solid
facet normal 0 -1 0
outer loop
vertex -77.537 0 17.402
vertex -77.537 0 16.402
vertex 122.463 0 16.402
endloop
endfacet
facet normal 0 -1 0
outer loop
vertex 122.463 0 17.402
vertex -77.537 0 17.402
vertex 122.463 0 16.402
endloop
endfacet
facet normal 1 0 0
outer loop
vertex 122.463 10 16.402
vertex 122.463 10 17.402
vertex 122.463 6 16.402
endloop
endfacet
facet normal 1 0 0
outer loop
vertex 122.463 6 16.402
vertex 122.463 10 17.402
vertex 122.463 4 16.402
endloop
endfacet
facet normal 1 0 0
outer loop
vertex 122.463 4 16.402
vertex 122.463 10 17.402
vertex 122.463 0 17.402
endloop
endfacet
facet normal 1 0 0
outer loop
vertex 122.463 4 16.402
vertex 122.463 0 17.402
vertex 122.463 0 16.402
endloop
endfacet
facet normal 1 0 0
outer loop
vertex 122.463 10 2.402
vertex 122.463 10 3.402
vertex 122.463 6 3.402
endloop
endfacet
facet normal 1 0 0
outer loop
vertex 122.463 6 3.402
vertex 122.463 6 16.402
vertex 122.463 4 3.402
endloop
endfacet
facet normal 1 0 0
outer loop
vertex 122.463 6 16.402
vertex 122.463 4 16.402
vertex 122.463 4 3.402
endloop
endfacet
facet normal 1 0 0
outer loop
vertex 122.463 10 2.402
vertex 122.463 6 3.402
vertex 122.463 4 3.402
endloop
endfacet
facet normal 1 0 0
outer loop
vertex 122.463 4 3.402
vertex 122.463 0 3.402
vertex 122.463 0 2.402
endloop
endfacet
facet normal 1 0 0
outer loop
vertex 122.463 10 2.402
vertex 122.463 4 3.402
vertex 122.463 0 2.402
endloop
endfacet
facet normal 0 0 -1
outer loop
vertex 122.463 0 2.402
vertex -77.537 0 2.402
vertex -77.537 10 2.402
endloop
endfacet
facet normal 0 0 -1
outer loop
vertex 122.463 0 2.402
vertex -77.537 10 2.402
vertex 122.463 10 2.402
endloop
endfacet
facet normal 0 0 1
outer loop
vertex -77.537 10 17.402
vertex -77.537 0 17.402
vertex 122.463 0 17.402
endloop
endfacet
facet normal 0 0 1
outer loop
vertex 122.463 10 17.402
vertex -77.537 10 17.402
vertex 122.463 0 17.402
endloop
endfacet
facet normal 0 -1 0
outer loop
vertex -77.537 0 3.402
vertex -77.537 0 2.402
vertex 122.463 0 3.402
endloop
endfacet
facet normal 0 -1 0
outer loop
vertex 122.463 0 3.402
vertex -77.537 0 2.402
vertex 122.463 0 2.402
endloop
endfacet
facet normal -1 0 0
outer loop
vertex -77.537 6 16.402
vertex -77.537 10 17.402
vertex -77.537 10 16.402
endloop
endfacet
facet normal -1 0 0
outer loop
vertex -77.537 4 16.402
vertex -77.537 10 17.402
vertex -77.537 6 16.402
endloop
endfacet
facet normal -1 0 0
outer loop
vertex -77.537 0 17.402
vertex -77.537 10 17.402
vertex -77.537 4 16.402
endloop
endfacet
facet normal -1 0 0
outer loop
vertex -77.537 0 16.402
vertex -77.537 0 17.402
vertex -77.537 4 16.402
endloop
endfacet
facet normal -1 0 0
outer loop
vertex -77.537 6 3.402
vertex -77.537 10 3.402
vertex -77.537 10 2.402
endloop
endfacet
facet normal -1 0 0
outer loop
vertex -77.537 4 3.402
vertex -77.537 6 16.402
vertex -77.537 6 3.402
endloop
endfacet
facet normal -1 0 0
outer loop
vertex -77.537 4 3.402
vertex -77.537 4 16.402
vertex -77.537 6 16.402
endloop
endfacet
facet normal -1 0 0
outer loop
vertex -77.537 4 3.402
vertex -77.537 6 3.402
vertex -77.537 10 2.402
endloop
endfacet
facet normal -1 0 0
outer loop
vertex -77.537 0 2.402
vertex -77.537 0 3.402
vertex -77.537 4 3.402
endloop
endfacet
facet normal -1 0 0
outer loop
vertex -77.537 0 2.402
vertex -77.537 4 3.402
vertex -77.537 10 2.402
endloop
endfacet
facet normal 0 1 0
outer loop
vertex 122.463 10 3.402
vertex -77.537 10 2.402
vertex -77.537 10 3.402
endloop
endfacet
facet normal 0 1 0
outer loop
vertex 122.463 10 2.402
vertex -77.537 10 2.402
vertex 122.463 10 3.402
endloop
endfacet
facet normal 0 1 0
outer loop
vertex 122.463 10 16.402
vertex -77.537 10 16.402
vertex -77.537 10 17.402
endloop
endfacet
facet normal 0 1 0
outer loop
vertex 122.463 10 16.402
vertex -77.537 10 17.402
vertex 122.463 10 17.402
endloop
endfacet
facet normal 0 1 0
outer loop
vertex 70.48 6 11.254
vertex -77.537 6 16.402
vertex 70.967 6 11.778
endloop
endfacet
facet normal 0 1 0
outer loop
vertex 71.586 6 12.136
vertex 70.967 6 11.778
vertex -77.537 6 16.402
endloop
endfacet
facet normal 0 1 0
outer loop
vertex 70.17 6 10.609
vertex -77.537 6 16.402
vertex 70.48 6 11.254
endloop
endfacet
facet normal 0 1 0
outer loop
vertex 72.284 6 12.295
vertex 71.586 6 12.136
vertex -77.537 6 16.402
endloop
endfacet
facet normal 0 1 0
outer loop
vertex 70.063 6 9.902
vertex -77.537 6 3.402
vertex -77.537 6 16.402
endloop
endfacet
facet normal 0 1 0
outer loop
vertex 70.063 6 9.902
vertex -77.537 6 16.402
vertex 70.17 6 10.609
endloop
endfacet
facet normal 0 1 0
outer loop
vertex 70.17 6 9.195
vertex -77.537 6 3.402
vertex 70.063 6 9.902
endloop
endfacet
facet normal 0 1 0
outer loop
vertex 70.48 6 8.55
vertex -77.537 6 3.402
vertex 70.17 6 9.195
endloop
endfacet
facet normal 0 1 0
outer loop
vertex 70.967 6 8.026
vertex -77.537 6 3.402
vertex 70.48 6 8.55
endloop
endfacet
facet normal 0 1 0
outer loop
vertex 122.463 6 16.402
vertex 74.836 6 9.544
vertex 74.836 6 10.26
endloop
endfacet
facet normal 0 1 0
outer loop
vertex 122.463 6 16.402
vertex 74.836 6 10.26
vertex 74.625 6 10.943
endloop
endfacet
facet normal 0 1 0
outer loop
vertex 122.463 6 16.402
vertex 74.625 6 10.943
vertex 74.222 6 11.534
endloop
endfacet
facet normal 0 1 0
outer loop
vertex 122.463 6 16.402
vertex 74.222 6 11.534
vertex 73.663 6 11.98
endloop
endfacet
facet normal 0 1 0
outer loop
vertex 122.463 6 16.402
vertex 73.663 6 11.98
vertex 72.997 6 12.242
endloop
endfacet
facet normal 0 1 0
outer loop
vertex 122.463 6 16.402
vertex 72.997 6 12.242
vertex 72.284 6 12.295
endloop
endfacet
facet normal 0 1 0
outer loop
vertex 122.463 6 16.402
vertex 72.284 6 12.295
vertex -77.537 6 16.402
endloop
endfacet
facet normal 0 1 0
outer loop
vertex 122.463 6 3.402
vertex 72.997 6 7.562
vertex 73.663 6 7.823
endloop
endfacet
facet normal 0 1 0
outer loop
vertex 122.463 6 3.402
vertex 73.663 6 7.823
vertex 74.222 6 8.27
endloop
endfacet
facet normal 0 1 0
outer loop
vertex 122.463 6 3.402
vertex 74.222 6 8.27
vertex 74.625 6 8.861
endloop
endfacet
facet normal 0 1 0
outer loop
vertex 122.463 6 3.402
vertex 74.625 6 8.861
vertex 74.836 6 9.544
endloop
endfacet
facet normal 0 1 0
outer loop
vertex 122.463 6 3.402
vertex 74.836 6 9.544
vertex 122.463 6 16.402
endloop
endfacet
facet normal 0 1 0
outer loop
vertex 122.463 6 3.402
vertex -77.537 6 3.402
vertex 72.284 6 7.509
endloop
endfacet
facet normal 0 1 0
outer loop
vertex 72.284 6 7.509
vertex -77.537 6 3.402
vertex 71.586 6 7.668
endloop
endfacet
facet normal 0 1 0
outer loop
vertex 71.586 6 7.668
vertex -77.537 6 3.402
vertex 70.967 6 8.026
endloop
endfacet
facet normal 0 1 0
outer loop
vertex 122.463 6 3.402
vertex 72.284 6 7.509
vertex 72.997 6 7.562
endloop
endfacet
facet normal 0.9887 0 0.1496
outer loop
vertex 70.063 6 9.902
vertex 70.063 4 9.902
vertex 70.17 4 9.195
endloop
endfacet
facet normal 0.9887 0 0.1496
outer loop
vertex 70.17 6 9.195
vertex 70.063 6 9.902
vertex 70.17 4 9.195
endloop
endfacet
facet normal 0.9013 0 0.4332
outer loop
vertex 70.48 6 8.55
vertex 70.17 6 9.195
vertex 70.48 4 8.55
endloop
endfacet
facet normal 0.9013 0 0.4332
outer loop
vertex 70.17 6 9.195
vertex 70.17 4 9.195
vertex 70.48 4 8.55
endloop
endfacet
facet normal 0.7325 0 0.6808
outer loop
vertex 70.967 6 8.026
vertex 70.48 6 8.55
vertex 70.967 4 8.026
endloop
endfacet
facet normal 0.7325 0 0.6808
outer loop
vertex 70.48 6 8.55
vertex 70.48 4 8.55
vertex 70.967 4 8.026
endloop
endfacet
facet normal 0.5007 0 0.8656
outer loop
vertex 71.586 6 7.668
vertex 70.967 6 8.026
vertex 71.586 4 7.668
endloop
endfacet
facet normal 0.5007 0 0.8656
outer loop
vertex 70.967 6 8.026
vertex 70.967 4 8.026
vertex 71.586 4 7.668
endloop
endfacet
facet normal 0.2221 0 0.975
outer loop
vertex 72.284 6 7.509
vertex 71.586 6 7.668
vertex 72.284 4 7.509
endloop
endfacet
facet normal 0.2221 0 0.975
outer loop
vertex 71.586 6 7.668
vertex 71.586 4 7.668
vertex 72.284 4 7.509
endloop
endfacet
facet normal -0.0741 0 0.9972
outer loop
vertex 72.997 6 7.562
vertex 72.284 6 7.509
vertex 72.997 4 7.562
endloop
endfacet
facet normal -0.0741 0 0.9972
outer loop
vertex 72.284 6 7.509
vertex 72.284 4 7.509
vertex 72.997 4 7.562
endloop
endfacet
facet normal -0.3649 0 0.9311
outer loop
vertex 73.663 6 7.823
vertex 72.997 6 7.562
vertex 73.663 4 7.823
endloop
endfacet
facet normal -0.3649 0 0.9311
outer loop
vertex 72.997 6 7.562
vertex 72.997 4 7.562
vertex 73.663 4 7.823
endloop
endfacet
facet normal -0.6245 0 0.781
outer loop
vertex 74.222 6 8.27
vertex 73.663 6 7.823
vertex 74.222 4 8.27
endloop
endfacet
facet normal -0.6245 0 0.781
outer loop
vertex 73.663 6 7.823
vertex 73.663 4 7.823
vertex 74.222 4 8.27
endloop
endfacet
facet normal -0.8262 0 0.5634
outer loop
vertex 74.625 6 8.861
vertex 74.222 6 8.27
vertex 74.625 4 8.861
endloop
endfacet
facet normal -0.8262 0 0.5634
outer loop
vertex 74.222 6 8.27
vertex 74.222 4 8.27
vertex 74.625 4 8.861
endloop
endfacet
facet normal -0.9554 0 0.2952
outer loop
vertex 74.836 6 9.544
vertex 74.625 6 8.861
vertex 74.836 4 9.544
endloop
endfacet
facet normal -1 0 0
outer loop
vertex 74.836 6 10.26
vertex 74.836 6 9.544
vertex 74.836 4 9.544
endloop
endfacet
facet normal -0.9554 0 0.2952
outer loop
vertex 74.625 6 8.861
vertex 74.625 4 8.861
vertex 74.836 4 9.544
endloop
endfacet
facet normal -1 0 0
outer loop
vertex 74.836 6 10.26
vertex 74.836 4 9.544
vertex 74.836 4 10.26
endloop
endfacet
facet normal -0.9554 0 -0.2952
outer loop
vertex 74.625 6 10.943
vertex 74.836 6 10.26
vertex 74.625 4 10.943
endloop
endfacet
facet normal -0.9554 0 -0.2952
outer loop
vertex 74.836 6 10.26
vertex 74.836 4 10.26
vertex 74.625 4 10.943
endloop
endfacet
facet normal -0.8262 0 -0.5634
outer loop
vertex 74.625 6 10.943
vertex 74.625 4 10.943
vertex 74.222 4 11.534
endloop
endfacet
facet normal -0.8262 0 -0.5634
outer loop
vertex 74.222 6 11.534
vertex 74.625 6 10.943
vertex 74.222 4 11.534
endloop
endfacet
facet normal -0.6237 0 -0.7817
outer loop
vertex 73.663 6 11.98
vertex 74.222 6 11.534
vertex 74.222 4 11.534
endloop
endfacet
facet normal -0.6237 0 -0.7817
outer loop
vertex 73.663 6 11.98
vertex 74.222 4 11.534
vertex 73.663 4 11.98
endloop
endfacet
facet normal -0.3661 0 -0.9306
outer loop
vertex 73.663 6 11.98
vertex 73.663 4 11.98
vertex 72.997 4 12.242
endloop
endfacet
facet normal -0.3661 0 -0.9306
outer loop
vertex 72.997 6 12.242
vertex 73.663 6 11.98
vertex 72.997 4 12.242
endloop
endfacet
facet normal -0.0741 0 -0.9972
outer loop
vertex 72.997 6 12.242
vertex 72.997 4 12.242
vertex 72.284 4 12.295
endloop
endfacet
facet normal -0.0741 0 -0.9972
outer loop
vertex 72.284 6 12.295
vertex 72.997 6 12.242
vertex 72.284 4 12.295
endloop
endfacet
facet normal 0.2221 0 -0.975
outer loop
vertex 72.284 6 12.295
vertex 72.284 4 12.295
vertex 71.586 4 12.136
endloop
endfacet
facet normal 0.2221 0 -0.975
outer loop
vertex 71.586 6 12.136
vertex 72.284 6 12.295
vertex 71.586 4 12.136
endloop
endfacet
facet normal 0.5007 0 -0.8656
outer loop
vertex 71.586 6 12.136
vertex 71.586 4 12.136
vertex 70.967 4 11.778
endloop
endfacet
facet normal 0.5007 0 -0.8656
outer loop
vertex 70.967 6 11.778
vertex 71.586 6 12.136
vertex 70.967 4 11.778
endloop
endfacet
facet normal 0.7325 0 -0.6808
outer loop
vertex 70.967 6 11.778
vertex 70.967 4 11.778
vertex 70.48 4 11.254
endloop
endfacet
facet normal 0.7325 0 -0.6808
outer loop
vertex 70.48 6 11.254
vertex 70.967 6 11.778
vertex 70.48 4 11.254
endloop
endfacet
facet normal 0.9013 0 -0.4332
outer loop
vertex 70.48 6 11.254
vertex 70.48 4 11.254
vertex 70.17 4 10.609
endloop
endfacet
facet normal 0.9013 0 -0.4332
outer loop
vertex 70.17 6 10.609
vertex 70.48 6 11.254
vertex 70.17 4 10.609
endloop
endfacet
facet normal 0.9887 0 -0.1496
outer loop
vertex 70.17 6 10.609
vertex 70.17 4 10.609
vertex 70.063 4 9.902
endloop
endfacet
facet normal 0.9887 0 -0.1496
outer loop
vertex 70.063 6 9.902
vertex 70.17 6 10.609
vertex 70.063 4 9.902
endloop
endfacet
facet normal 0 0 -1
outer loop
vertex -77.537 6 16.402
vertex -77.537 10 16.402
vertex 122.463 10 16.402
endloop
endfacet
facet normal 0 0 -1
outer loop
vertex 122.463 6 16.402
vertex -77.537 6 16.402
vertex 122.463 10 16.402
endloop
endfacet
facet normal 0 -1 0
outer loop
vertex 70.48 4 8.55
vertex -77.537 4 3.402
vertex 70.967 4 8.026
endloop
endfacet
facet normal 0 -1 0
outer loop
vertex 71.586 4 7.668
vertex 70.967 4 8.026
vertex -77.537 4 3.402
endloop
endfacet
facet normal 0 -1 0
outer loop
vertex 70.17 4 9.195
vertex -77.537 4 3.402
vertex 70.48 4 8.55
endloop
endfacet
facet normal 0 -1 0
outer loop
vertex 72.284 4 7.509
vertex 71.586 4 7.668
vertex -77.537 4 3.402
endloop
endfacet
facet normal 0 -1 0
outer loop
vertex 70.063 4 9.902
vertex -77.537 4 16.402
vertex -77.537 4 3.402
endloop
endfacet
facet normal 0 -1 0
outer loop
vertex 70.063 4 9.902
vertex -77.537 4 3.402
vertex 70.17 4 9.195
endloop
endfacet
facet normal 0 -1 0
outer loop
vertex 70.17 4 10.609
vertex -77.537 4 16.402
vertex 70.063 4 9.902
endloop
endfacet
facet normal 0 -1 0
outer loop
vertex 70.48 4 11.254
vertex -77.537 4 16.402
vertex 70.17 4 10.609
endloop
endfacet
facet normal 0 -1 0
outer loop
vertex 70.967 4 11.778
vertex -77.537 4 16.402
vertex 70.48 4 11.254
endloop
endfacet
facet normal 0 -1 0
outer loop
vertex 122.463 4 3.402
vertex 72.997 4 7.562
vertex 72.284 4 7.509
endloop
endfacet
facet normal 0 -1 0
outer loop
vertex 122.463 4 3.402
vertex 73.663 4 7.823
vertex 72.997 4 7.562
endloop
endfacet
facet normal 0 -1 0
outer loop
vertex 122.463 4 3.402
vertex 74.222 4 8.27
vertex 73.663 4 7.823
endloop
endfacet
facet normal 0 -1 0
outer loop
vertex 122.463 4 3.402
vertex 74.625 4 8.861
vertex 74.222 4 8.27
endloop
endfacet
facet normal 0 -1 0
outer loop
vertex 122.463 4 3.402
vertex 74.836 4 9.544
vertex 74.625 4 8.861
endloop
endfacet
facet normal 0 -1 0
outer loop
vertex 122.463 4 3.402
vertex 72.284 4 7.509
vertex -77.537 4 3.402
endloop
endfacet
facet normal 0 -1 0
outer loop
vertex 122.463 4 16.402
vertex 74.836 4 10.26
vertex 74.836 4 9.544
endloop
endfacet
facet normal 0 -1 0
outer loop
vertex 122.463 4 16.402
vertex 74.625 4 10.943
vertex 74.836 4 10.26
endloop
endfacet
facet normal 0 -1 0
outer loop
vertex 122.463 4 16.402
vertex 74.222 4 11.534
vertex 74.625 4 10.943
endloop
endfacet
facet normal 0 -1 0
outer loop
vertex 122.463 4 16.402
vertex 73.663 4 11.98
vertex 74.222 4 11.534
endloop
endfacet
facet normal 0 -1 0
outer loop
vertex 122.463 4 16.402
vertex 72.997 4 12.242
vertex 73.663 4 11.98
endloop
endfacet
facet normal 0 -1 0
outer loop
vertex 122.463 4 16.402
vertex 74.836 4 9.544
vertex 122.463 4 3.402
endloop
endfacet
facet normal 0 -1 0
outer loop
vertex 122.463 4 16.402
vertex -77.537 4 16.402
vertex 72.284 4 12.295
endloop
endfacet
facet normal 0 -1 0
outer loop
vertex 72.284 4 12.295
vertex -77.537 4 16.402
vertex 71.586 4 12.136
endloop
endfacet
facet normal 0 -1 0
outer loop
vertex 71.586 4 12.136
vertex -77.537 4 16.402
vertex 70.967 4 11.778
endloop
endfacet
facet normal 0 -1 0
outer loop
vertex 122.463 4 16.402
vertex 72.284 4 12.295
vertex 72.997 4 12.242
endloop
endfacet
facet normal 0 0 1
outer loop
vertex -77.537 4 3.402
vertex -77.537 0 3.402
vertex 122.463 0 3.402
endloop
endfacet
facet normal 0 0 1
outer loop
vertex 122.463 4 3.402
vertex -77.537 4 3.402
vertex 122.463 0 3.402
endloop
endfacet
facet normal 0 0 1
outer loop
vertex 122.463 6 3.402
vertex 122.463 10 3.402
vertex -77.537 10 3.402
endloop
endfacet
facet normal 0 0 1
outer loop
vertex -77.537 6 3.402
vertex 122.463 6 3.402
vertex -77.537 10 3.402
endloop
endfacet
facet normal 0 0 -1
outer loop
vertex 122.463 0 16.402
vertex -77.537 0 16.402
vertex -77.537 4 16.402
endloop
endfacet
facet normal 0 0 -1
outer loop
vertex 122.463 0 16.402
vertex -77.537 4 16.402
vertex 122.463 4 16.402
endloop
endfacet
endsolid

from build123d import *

# Parameters (mm, degrees)
SKETCH1_W           = 200
SKETCH1_H           = 15
BOSS_EXTRUDE1_DEPTH = 10
CUT_EXTRUDE1_DEPTH  = 4
SKETCH4_W           = 200
SKETCH4_H           = 13
CUT_EXTRUDE2_DEPTH  = 4
SKETCH5_R           = 2.4
CUT_EXTRUDE3_DEPTH  = 10


with BuildPart() as part:
    # Sketch1 → Boss-Extrude1 (new body)
    with BuildSketch(Plane(origin=(0, 0, 0), x_dir=(1, 0, 0), z_dir=(0, 1, 0))):
        with Locations((22.463138005, -9.901926804)):
            Rectangle(SKETCH1_W, SKETCH1_H)
    extrude(amount=BOSS_EXTRUDE1_DEPTH)

    # Sketch3 → Cut-Extrude1 (cut)
    with BuildSketch(Plane(origin=(0, 10, 0), x_dir=(1, 0, 0), z_dir=(0, 1, 0))):
        Polygon((-77.536861995, -3.454668646), (-77.536861995, -16.401926804), (122.463138005, -16.401926804), (122.463138005, -3.541728885), (122.463138005, -3.401926804), (-77.536861995, -3.401926804), align=None)
    extrude(amount=-CUT_EXTRUDE1_DEPTH, mode=Mode.SUBTRACT)

    # Sketch4 → Cut-Extrude2 (cut)
    with BuildSketch(Plane.XZ):
        with Locations((22.463138005, 9.901926804)):
            Rectangle(SKETCH4_W, SKETCH4_H)
    extrude(amount=-CUT_EXTRUDE2_DEPTH, mode=Mode.SUBTRACT)

    # Sketch5 → Cut-Extrude3 (cut)
    with BuildSketch(Plane(origin=(0, 4, 0), x_dir=(-1, 0, 0), z_dir=(0, -1, 0))):
        with Locations((-72.463138005, -9.901926804)):
            Circle(SKETCH5_R)
    extrude(amount=-CUT_EXTRUDE3_DEPTH, mode=Mode.SUBTRACT)


solid = part.part
